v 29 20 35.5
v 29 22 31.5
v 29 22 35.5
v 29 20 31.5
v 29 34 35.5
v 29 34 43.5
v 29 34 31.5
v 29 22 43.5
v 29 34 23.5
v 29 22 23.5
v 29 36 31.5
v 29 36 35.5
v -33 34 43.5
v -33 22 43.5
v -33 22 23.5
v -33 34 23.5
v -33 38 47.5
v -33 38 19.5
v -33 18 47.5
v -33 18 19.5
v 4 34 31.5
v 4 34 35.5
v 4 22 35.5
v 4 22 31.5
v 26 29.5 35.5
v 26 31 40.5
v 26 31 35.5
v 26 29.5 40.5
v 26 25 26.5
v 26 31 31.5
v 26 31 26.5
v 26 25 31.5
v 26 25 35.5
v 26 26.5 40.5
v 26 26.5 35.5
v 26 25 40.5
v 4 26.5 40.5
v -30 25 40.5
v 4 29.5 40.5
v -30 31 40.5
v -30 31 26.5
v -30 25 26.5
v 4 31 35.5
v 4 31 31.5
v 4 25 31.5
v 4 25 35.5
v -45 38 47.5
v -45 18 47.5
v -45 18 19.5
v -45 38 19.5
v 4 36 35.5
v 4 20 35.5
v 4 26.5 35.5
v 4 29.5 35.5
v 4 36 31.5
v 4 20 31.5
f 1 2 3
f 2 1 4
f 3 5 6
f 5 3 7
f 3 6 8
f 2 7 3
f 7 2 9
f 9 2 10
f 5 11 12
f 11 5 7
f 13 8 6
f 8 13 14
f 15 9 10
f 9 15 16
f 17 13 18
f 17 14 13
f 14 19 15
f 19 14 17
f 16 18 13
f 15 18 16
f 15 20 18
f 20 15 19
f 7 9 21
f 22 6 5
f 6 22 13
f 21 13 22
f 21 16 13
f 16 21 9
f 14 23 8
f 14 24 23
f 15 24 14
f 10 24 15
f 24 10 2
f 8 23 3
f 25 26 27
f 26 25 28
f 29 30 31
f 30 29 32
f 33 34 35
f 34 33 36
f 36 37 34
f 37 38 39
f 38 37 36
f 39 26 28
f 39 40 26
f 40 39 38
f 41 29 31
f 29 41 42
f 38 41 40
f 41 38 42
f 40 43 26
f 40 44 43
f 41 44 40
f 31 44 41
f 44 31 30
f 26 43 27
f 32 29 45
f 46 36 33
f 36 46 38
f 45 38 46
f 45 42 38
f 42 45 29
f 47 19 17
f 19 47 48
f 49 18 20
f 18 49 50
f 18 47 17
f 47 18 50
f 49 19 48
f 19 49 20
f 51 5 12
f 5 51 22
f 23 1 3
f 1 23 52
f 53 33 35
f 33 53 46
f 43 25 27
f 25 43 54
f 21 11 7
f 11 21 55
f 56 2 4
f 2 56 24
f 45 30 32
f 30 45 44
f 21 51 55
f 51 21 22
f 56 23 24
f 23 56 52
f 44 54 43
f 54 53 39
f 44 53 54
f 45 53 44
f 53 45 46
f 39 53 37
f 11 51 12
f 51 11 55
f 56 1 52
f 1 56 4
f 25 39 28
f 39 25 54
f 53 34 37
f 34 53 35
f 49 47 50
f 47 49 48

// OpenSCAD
// file: utils.scad
include <parameters.scad>

module beamBetween(p1, p2, width, height) {
    dx = p2[0] - p1[0];
    dz = p2[2] - p1[2];
    length = sqrt(dx * dx + dz * dz);
    angle = atan2(dz, dx);

    translate([(p1[0] + p2[0]) / 2, (p1[1] + p2[1]) / 2, (p1[2] + p2[2]) / 2])
        rotate([0, -angle, 0])
            cube([length, width, height], center = true);
}
// file: suspension.scad
include <parameters.scad>
use <utils.scad>

//================ RUBBER BUSHING SUSPENSION =================//
module suspension(x, y) {
    beamZ = idlerZ + trackRadius + 6;
    spindleZ = roadZ;
    gap = beamZ - spindleZ - 8;

    color(matDarkSteel)
        translate([x, y, beamZ - 1])
            cylinder(r = bushingRadius + 2, h = 2, center = true, $fn = 20);

    color(matRubber)
        translate([x, y, spindleZ + 4 + gap / 2])
            difference() {
                cylinder(r = bushingRadius, h = gap, center = true, $fn = 24);
                cylinder(r = 1.5, h = gap + 1, center = true, $fn = 16);
            }

    color(matDarkSteel)
        translate([x, y, spindleZ + 4])
            cylinder(r = bushingRadius + 2, h = 2, center = true, $fn = 20);

    translate([x, y, spindleZ])
        color(matDarkSteel)
            rotate([90, 0, 0])
                cylinder(r = 4, h = trackWidth + 4, center = true, $fn = 24);
}

//================ SUSPENSION BEAM (STRUCTURAL) =================//
module suspensionBeam(y) {
    beamZ = idlerZ + trackRadius + 6;
    beamStart = -idlerX + 8;
    beamEnd = idlerX - 12;
    beamLength = beamEnd - beamStart;

    wall = 3;
    boxH = 20;
    boxW = 12;

    gussetH = 25;
    gussetW = boxW + 4;
    gussetT = 4;

    flangeLen = 12;
    flangeH = boxH + 8;
    flangeW = boxW + 8;
    axleR = 5.5;

    color(matAluminum)
    union() {
        // Main beam tube
        translate([(beamStart + beamEnd) / 2, y, beamZ])
            difference() {
                cube([beamLength, boxW, boxH], center = true);
                cube([beamLength - 2*wall, boxW - 2*wall, boxH - 2*wall], center = true);
            }

        // Gusset at bracket end
        translate([beamEnd - gussetH/2, y, beamZ])
            cube([gussetH, gussetW, gussetT], center = true);

        // Vertical gusset plate at bracket end
        translate([beamEnd - gussetH/2, y, beamZ + gussetT/2 + (boxH - gussetT)/4])
            cube([gussetH, 3, (boxH - gussetT)/2], center = true);

        // Flange at chassis end - C-channel base
        translate([beamStart - flangeLen/2, y, beamZ])
            cube([flangeLen, flangeW, flangeH], center = true);

        // Flange notch (axle clearance U-shape)
        translate([beamStart - flangeLen/2 + 3, y, beamZ])
            difference() {
                cube([flangeLen - 6, flangeW, flangeH], center = true);
                cube([flangeLen - 6 - 2*wall, flangeW - 2*wall, flangeH - 2*wall], center = true);
                translate([-2, 0, -flangeH/2 + axleR + 2])
                    rotate([90, 0, 0])
                        cylinder(r = axleR, h = flangeW + 4, center = true, $fn = 24);
            }
    }
}
// file: parameters.scad
// Shared parameters for tracked wheelchair prototype
// NOTE: 1 unit = 1 cm (seat target 450 mm = 45 units above ground).
$fn = 48;

//================ MATERIALS =================//
// Frame: aluminum 6061-T6 (lightweight)
// Seat: carbon fiber T700 + honeycomb (ultralight)
// Suspension: rubber bushings (lightweight)
// Axles: aluminum 7075-T6 (1/3 weight of steel)
matSteel      = [0.35, 0.36, 0.38];   // hardware / fasteners only
matDarkSteel  = [0.25, 0.26, 0.28];
matRubber     = [0.12, 0.12, 0.14];   // track belt + bushings
matAluminum   = [0.55, 0.57, 0.60];   // primary frame material
matChrome     = [0.70, 0.72, 0.75];
matCarbon     = [0.15, 0.15, 0.18];   // (unused — seat now aluminum)
matLeather    = [0.45, 0.25, 0.12];   // leather cushion color

//================ TRACKS =================//
trackLength = 82;
trackWidth = 14;
trackCenterY = 28;

idlerRadius = 10;
idlerX = trackLength / 2;
idlerZ = 16;
roadRadius = 7;
roadZ = 13;  // road wheels roll on the belt's inner surface (belt upper edge at this height)
roadPositions = [-22, -6, 10, 24];

linkLength = 10;
linkWidth = trackWidth + 2;
linkThickness = 3;
linkGap = 1;
// Belt centerline clears the idler wheels plus link half-thickness,
// so the links ride on the wheels instead of clipping through them.
trackRadius = idlerRadius + linkThickness / 2;  // = 11.5
beltThickness = 3;
groundZ = idlerZ - trackRadius;  // bottom of track = ground level (4.5)

//================ HYDRAULIC JACK WHEEL =================//
trackTilt = 0;
liftPivotX = idlerX;
liftPivotZ = idlerZ;
// Electric linear actuator (24V DC, 500kg, 300mm stroke).
// 1/3 weight of hydraulic system.
hydrWheelRadius = 4;
hydrWheelWidth = 10;
hydrBarrelRadius = 4;        // smaller barrel (mini actuator)
hydrBarrelHeight = 12;       // shorter barrel
hydrRodRadius = 2;
// At full extension the jack wheel rests on the ground:
// mountZ 35 - groundZ 4.5 - wheelR 4 = 26.5
hydrExtend = 26.5;
hydrRetracted = 0;
hydrExtendAmount = hydrExtend;
hydrMountX = 10;   // jack mount x; moved forward (from 24) for first-stair clearance
hydrMountY = 0;

//================ CHASSIS =================//
chassisLength = 82;
chassisBottom = 35;
chassisHeight = 12;

//================ SEAT =================//
// Seat geometry: flat aluminium pan + leather cushion + slim backrest.
// Seat surface rides at 450 mm (45 units) above the ground.
// topZ = idlerZ + seatTopOffset = 49.5, ground at 4.5 -> seat 45 above ground.
seatPanLength = 66;
seatPanWidth = 66;
backShellHeight = 72;
headrestHeight = 16;
seatTopOffset = 45 - trackRadius;  // = 33.5
// Backrest recline (deg from vertical).
seatBackRecline = 8;

//================ FOOTREST =================//
footrestWidth = 34;
footrestLength = 28;
footrestThickness = 3;       // 3mm aluminum plate
footrestHeight = idlerZ + 12;
footrestFrontX = -30 - footrestLength / 2;  // plate center, extends forward from arm end

// Folding footplate pivots at the end of the L-bracket arm.
footPivotX = -30;                           // end of L-bracket horizontal arm
footPivotZ = idlerZ + seatTopOffset - 7;    // arm height (panB - 2)
footHeelGuard = true;                       // optional heel guard
footToeGuard = false;                       // optional toe guard (off by default)

//================ ARMRESTS =================//
armPivotX = idlerX - 14;                     // rear post at the seat back
armLength = 68;                              // full-length pad (covers seat depth)
armPadHeight = idlerZ + seatTopOffset + 19;  // pad top = elbow height (~19 above seat top)
armPadWidth = 8;
armPadThick = 4;
// main file
// STL EXPORT: Suspension beam (single side)
include <parameters.scad>
use <suspension.scad>
suspensionBeam(trackCenterY);
